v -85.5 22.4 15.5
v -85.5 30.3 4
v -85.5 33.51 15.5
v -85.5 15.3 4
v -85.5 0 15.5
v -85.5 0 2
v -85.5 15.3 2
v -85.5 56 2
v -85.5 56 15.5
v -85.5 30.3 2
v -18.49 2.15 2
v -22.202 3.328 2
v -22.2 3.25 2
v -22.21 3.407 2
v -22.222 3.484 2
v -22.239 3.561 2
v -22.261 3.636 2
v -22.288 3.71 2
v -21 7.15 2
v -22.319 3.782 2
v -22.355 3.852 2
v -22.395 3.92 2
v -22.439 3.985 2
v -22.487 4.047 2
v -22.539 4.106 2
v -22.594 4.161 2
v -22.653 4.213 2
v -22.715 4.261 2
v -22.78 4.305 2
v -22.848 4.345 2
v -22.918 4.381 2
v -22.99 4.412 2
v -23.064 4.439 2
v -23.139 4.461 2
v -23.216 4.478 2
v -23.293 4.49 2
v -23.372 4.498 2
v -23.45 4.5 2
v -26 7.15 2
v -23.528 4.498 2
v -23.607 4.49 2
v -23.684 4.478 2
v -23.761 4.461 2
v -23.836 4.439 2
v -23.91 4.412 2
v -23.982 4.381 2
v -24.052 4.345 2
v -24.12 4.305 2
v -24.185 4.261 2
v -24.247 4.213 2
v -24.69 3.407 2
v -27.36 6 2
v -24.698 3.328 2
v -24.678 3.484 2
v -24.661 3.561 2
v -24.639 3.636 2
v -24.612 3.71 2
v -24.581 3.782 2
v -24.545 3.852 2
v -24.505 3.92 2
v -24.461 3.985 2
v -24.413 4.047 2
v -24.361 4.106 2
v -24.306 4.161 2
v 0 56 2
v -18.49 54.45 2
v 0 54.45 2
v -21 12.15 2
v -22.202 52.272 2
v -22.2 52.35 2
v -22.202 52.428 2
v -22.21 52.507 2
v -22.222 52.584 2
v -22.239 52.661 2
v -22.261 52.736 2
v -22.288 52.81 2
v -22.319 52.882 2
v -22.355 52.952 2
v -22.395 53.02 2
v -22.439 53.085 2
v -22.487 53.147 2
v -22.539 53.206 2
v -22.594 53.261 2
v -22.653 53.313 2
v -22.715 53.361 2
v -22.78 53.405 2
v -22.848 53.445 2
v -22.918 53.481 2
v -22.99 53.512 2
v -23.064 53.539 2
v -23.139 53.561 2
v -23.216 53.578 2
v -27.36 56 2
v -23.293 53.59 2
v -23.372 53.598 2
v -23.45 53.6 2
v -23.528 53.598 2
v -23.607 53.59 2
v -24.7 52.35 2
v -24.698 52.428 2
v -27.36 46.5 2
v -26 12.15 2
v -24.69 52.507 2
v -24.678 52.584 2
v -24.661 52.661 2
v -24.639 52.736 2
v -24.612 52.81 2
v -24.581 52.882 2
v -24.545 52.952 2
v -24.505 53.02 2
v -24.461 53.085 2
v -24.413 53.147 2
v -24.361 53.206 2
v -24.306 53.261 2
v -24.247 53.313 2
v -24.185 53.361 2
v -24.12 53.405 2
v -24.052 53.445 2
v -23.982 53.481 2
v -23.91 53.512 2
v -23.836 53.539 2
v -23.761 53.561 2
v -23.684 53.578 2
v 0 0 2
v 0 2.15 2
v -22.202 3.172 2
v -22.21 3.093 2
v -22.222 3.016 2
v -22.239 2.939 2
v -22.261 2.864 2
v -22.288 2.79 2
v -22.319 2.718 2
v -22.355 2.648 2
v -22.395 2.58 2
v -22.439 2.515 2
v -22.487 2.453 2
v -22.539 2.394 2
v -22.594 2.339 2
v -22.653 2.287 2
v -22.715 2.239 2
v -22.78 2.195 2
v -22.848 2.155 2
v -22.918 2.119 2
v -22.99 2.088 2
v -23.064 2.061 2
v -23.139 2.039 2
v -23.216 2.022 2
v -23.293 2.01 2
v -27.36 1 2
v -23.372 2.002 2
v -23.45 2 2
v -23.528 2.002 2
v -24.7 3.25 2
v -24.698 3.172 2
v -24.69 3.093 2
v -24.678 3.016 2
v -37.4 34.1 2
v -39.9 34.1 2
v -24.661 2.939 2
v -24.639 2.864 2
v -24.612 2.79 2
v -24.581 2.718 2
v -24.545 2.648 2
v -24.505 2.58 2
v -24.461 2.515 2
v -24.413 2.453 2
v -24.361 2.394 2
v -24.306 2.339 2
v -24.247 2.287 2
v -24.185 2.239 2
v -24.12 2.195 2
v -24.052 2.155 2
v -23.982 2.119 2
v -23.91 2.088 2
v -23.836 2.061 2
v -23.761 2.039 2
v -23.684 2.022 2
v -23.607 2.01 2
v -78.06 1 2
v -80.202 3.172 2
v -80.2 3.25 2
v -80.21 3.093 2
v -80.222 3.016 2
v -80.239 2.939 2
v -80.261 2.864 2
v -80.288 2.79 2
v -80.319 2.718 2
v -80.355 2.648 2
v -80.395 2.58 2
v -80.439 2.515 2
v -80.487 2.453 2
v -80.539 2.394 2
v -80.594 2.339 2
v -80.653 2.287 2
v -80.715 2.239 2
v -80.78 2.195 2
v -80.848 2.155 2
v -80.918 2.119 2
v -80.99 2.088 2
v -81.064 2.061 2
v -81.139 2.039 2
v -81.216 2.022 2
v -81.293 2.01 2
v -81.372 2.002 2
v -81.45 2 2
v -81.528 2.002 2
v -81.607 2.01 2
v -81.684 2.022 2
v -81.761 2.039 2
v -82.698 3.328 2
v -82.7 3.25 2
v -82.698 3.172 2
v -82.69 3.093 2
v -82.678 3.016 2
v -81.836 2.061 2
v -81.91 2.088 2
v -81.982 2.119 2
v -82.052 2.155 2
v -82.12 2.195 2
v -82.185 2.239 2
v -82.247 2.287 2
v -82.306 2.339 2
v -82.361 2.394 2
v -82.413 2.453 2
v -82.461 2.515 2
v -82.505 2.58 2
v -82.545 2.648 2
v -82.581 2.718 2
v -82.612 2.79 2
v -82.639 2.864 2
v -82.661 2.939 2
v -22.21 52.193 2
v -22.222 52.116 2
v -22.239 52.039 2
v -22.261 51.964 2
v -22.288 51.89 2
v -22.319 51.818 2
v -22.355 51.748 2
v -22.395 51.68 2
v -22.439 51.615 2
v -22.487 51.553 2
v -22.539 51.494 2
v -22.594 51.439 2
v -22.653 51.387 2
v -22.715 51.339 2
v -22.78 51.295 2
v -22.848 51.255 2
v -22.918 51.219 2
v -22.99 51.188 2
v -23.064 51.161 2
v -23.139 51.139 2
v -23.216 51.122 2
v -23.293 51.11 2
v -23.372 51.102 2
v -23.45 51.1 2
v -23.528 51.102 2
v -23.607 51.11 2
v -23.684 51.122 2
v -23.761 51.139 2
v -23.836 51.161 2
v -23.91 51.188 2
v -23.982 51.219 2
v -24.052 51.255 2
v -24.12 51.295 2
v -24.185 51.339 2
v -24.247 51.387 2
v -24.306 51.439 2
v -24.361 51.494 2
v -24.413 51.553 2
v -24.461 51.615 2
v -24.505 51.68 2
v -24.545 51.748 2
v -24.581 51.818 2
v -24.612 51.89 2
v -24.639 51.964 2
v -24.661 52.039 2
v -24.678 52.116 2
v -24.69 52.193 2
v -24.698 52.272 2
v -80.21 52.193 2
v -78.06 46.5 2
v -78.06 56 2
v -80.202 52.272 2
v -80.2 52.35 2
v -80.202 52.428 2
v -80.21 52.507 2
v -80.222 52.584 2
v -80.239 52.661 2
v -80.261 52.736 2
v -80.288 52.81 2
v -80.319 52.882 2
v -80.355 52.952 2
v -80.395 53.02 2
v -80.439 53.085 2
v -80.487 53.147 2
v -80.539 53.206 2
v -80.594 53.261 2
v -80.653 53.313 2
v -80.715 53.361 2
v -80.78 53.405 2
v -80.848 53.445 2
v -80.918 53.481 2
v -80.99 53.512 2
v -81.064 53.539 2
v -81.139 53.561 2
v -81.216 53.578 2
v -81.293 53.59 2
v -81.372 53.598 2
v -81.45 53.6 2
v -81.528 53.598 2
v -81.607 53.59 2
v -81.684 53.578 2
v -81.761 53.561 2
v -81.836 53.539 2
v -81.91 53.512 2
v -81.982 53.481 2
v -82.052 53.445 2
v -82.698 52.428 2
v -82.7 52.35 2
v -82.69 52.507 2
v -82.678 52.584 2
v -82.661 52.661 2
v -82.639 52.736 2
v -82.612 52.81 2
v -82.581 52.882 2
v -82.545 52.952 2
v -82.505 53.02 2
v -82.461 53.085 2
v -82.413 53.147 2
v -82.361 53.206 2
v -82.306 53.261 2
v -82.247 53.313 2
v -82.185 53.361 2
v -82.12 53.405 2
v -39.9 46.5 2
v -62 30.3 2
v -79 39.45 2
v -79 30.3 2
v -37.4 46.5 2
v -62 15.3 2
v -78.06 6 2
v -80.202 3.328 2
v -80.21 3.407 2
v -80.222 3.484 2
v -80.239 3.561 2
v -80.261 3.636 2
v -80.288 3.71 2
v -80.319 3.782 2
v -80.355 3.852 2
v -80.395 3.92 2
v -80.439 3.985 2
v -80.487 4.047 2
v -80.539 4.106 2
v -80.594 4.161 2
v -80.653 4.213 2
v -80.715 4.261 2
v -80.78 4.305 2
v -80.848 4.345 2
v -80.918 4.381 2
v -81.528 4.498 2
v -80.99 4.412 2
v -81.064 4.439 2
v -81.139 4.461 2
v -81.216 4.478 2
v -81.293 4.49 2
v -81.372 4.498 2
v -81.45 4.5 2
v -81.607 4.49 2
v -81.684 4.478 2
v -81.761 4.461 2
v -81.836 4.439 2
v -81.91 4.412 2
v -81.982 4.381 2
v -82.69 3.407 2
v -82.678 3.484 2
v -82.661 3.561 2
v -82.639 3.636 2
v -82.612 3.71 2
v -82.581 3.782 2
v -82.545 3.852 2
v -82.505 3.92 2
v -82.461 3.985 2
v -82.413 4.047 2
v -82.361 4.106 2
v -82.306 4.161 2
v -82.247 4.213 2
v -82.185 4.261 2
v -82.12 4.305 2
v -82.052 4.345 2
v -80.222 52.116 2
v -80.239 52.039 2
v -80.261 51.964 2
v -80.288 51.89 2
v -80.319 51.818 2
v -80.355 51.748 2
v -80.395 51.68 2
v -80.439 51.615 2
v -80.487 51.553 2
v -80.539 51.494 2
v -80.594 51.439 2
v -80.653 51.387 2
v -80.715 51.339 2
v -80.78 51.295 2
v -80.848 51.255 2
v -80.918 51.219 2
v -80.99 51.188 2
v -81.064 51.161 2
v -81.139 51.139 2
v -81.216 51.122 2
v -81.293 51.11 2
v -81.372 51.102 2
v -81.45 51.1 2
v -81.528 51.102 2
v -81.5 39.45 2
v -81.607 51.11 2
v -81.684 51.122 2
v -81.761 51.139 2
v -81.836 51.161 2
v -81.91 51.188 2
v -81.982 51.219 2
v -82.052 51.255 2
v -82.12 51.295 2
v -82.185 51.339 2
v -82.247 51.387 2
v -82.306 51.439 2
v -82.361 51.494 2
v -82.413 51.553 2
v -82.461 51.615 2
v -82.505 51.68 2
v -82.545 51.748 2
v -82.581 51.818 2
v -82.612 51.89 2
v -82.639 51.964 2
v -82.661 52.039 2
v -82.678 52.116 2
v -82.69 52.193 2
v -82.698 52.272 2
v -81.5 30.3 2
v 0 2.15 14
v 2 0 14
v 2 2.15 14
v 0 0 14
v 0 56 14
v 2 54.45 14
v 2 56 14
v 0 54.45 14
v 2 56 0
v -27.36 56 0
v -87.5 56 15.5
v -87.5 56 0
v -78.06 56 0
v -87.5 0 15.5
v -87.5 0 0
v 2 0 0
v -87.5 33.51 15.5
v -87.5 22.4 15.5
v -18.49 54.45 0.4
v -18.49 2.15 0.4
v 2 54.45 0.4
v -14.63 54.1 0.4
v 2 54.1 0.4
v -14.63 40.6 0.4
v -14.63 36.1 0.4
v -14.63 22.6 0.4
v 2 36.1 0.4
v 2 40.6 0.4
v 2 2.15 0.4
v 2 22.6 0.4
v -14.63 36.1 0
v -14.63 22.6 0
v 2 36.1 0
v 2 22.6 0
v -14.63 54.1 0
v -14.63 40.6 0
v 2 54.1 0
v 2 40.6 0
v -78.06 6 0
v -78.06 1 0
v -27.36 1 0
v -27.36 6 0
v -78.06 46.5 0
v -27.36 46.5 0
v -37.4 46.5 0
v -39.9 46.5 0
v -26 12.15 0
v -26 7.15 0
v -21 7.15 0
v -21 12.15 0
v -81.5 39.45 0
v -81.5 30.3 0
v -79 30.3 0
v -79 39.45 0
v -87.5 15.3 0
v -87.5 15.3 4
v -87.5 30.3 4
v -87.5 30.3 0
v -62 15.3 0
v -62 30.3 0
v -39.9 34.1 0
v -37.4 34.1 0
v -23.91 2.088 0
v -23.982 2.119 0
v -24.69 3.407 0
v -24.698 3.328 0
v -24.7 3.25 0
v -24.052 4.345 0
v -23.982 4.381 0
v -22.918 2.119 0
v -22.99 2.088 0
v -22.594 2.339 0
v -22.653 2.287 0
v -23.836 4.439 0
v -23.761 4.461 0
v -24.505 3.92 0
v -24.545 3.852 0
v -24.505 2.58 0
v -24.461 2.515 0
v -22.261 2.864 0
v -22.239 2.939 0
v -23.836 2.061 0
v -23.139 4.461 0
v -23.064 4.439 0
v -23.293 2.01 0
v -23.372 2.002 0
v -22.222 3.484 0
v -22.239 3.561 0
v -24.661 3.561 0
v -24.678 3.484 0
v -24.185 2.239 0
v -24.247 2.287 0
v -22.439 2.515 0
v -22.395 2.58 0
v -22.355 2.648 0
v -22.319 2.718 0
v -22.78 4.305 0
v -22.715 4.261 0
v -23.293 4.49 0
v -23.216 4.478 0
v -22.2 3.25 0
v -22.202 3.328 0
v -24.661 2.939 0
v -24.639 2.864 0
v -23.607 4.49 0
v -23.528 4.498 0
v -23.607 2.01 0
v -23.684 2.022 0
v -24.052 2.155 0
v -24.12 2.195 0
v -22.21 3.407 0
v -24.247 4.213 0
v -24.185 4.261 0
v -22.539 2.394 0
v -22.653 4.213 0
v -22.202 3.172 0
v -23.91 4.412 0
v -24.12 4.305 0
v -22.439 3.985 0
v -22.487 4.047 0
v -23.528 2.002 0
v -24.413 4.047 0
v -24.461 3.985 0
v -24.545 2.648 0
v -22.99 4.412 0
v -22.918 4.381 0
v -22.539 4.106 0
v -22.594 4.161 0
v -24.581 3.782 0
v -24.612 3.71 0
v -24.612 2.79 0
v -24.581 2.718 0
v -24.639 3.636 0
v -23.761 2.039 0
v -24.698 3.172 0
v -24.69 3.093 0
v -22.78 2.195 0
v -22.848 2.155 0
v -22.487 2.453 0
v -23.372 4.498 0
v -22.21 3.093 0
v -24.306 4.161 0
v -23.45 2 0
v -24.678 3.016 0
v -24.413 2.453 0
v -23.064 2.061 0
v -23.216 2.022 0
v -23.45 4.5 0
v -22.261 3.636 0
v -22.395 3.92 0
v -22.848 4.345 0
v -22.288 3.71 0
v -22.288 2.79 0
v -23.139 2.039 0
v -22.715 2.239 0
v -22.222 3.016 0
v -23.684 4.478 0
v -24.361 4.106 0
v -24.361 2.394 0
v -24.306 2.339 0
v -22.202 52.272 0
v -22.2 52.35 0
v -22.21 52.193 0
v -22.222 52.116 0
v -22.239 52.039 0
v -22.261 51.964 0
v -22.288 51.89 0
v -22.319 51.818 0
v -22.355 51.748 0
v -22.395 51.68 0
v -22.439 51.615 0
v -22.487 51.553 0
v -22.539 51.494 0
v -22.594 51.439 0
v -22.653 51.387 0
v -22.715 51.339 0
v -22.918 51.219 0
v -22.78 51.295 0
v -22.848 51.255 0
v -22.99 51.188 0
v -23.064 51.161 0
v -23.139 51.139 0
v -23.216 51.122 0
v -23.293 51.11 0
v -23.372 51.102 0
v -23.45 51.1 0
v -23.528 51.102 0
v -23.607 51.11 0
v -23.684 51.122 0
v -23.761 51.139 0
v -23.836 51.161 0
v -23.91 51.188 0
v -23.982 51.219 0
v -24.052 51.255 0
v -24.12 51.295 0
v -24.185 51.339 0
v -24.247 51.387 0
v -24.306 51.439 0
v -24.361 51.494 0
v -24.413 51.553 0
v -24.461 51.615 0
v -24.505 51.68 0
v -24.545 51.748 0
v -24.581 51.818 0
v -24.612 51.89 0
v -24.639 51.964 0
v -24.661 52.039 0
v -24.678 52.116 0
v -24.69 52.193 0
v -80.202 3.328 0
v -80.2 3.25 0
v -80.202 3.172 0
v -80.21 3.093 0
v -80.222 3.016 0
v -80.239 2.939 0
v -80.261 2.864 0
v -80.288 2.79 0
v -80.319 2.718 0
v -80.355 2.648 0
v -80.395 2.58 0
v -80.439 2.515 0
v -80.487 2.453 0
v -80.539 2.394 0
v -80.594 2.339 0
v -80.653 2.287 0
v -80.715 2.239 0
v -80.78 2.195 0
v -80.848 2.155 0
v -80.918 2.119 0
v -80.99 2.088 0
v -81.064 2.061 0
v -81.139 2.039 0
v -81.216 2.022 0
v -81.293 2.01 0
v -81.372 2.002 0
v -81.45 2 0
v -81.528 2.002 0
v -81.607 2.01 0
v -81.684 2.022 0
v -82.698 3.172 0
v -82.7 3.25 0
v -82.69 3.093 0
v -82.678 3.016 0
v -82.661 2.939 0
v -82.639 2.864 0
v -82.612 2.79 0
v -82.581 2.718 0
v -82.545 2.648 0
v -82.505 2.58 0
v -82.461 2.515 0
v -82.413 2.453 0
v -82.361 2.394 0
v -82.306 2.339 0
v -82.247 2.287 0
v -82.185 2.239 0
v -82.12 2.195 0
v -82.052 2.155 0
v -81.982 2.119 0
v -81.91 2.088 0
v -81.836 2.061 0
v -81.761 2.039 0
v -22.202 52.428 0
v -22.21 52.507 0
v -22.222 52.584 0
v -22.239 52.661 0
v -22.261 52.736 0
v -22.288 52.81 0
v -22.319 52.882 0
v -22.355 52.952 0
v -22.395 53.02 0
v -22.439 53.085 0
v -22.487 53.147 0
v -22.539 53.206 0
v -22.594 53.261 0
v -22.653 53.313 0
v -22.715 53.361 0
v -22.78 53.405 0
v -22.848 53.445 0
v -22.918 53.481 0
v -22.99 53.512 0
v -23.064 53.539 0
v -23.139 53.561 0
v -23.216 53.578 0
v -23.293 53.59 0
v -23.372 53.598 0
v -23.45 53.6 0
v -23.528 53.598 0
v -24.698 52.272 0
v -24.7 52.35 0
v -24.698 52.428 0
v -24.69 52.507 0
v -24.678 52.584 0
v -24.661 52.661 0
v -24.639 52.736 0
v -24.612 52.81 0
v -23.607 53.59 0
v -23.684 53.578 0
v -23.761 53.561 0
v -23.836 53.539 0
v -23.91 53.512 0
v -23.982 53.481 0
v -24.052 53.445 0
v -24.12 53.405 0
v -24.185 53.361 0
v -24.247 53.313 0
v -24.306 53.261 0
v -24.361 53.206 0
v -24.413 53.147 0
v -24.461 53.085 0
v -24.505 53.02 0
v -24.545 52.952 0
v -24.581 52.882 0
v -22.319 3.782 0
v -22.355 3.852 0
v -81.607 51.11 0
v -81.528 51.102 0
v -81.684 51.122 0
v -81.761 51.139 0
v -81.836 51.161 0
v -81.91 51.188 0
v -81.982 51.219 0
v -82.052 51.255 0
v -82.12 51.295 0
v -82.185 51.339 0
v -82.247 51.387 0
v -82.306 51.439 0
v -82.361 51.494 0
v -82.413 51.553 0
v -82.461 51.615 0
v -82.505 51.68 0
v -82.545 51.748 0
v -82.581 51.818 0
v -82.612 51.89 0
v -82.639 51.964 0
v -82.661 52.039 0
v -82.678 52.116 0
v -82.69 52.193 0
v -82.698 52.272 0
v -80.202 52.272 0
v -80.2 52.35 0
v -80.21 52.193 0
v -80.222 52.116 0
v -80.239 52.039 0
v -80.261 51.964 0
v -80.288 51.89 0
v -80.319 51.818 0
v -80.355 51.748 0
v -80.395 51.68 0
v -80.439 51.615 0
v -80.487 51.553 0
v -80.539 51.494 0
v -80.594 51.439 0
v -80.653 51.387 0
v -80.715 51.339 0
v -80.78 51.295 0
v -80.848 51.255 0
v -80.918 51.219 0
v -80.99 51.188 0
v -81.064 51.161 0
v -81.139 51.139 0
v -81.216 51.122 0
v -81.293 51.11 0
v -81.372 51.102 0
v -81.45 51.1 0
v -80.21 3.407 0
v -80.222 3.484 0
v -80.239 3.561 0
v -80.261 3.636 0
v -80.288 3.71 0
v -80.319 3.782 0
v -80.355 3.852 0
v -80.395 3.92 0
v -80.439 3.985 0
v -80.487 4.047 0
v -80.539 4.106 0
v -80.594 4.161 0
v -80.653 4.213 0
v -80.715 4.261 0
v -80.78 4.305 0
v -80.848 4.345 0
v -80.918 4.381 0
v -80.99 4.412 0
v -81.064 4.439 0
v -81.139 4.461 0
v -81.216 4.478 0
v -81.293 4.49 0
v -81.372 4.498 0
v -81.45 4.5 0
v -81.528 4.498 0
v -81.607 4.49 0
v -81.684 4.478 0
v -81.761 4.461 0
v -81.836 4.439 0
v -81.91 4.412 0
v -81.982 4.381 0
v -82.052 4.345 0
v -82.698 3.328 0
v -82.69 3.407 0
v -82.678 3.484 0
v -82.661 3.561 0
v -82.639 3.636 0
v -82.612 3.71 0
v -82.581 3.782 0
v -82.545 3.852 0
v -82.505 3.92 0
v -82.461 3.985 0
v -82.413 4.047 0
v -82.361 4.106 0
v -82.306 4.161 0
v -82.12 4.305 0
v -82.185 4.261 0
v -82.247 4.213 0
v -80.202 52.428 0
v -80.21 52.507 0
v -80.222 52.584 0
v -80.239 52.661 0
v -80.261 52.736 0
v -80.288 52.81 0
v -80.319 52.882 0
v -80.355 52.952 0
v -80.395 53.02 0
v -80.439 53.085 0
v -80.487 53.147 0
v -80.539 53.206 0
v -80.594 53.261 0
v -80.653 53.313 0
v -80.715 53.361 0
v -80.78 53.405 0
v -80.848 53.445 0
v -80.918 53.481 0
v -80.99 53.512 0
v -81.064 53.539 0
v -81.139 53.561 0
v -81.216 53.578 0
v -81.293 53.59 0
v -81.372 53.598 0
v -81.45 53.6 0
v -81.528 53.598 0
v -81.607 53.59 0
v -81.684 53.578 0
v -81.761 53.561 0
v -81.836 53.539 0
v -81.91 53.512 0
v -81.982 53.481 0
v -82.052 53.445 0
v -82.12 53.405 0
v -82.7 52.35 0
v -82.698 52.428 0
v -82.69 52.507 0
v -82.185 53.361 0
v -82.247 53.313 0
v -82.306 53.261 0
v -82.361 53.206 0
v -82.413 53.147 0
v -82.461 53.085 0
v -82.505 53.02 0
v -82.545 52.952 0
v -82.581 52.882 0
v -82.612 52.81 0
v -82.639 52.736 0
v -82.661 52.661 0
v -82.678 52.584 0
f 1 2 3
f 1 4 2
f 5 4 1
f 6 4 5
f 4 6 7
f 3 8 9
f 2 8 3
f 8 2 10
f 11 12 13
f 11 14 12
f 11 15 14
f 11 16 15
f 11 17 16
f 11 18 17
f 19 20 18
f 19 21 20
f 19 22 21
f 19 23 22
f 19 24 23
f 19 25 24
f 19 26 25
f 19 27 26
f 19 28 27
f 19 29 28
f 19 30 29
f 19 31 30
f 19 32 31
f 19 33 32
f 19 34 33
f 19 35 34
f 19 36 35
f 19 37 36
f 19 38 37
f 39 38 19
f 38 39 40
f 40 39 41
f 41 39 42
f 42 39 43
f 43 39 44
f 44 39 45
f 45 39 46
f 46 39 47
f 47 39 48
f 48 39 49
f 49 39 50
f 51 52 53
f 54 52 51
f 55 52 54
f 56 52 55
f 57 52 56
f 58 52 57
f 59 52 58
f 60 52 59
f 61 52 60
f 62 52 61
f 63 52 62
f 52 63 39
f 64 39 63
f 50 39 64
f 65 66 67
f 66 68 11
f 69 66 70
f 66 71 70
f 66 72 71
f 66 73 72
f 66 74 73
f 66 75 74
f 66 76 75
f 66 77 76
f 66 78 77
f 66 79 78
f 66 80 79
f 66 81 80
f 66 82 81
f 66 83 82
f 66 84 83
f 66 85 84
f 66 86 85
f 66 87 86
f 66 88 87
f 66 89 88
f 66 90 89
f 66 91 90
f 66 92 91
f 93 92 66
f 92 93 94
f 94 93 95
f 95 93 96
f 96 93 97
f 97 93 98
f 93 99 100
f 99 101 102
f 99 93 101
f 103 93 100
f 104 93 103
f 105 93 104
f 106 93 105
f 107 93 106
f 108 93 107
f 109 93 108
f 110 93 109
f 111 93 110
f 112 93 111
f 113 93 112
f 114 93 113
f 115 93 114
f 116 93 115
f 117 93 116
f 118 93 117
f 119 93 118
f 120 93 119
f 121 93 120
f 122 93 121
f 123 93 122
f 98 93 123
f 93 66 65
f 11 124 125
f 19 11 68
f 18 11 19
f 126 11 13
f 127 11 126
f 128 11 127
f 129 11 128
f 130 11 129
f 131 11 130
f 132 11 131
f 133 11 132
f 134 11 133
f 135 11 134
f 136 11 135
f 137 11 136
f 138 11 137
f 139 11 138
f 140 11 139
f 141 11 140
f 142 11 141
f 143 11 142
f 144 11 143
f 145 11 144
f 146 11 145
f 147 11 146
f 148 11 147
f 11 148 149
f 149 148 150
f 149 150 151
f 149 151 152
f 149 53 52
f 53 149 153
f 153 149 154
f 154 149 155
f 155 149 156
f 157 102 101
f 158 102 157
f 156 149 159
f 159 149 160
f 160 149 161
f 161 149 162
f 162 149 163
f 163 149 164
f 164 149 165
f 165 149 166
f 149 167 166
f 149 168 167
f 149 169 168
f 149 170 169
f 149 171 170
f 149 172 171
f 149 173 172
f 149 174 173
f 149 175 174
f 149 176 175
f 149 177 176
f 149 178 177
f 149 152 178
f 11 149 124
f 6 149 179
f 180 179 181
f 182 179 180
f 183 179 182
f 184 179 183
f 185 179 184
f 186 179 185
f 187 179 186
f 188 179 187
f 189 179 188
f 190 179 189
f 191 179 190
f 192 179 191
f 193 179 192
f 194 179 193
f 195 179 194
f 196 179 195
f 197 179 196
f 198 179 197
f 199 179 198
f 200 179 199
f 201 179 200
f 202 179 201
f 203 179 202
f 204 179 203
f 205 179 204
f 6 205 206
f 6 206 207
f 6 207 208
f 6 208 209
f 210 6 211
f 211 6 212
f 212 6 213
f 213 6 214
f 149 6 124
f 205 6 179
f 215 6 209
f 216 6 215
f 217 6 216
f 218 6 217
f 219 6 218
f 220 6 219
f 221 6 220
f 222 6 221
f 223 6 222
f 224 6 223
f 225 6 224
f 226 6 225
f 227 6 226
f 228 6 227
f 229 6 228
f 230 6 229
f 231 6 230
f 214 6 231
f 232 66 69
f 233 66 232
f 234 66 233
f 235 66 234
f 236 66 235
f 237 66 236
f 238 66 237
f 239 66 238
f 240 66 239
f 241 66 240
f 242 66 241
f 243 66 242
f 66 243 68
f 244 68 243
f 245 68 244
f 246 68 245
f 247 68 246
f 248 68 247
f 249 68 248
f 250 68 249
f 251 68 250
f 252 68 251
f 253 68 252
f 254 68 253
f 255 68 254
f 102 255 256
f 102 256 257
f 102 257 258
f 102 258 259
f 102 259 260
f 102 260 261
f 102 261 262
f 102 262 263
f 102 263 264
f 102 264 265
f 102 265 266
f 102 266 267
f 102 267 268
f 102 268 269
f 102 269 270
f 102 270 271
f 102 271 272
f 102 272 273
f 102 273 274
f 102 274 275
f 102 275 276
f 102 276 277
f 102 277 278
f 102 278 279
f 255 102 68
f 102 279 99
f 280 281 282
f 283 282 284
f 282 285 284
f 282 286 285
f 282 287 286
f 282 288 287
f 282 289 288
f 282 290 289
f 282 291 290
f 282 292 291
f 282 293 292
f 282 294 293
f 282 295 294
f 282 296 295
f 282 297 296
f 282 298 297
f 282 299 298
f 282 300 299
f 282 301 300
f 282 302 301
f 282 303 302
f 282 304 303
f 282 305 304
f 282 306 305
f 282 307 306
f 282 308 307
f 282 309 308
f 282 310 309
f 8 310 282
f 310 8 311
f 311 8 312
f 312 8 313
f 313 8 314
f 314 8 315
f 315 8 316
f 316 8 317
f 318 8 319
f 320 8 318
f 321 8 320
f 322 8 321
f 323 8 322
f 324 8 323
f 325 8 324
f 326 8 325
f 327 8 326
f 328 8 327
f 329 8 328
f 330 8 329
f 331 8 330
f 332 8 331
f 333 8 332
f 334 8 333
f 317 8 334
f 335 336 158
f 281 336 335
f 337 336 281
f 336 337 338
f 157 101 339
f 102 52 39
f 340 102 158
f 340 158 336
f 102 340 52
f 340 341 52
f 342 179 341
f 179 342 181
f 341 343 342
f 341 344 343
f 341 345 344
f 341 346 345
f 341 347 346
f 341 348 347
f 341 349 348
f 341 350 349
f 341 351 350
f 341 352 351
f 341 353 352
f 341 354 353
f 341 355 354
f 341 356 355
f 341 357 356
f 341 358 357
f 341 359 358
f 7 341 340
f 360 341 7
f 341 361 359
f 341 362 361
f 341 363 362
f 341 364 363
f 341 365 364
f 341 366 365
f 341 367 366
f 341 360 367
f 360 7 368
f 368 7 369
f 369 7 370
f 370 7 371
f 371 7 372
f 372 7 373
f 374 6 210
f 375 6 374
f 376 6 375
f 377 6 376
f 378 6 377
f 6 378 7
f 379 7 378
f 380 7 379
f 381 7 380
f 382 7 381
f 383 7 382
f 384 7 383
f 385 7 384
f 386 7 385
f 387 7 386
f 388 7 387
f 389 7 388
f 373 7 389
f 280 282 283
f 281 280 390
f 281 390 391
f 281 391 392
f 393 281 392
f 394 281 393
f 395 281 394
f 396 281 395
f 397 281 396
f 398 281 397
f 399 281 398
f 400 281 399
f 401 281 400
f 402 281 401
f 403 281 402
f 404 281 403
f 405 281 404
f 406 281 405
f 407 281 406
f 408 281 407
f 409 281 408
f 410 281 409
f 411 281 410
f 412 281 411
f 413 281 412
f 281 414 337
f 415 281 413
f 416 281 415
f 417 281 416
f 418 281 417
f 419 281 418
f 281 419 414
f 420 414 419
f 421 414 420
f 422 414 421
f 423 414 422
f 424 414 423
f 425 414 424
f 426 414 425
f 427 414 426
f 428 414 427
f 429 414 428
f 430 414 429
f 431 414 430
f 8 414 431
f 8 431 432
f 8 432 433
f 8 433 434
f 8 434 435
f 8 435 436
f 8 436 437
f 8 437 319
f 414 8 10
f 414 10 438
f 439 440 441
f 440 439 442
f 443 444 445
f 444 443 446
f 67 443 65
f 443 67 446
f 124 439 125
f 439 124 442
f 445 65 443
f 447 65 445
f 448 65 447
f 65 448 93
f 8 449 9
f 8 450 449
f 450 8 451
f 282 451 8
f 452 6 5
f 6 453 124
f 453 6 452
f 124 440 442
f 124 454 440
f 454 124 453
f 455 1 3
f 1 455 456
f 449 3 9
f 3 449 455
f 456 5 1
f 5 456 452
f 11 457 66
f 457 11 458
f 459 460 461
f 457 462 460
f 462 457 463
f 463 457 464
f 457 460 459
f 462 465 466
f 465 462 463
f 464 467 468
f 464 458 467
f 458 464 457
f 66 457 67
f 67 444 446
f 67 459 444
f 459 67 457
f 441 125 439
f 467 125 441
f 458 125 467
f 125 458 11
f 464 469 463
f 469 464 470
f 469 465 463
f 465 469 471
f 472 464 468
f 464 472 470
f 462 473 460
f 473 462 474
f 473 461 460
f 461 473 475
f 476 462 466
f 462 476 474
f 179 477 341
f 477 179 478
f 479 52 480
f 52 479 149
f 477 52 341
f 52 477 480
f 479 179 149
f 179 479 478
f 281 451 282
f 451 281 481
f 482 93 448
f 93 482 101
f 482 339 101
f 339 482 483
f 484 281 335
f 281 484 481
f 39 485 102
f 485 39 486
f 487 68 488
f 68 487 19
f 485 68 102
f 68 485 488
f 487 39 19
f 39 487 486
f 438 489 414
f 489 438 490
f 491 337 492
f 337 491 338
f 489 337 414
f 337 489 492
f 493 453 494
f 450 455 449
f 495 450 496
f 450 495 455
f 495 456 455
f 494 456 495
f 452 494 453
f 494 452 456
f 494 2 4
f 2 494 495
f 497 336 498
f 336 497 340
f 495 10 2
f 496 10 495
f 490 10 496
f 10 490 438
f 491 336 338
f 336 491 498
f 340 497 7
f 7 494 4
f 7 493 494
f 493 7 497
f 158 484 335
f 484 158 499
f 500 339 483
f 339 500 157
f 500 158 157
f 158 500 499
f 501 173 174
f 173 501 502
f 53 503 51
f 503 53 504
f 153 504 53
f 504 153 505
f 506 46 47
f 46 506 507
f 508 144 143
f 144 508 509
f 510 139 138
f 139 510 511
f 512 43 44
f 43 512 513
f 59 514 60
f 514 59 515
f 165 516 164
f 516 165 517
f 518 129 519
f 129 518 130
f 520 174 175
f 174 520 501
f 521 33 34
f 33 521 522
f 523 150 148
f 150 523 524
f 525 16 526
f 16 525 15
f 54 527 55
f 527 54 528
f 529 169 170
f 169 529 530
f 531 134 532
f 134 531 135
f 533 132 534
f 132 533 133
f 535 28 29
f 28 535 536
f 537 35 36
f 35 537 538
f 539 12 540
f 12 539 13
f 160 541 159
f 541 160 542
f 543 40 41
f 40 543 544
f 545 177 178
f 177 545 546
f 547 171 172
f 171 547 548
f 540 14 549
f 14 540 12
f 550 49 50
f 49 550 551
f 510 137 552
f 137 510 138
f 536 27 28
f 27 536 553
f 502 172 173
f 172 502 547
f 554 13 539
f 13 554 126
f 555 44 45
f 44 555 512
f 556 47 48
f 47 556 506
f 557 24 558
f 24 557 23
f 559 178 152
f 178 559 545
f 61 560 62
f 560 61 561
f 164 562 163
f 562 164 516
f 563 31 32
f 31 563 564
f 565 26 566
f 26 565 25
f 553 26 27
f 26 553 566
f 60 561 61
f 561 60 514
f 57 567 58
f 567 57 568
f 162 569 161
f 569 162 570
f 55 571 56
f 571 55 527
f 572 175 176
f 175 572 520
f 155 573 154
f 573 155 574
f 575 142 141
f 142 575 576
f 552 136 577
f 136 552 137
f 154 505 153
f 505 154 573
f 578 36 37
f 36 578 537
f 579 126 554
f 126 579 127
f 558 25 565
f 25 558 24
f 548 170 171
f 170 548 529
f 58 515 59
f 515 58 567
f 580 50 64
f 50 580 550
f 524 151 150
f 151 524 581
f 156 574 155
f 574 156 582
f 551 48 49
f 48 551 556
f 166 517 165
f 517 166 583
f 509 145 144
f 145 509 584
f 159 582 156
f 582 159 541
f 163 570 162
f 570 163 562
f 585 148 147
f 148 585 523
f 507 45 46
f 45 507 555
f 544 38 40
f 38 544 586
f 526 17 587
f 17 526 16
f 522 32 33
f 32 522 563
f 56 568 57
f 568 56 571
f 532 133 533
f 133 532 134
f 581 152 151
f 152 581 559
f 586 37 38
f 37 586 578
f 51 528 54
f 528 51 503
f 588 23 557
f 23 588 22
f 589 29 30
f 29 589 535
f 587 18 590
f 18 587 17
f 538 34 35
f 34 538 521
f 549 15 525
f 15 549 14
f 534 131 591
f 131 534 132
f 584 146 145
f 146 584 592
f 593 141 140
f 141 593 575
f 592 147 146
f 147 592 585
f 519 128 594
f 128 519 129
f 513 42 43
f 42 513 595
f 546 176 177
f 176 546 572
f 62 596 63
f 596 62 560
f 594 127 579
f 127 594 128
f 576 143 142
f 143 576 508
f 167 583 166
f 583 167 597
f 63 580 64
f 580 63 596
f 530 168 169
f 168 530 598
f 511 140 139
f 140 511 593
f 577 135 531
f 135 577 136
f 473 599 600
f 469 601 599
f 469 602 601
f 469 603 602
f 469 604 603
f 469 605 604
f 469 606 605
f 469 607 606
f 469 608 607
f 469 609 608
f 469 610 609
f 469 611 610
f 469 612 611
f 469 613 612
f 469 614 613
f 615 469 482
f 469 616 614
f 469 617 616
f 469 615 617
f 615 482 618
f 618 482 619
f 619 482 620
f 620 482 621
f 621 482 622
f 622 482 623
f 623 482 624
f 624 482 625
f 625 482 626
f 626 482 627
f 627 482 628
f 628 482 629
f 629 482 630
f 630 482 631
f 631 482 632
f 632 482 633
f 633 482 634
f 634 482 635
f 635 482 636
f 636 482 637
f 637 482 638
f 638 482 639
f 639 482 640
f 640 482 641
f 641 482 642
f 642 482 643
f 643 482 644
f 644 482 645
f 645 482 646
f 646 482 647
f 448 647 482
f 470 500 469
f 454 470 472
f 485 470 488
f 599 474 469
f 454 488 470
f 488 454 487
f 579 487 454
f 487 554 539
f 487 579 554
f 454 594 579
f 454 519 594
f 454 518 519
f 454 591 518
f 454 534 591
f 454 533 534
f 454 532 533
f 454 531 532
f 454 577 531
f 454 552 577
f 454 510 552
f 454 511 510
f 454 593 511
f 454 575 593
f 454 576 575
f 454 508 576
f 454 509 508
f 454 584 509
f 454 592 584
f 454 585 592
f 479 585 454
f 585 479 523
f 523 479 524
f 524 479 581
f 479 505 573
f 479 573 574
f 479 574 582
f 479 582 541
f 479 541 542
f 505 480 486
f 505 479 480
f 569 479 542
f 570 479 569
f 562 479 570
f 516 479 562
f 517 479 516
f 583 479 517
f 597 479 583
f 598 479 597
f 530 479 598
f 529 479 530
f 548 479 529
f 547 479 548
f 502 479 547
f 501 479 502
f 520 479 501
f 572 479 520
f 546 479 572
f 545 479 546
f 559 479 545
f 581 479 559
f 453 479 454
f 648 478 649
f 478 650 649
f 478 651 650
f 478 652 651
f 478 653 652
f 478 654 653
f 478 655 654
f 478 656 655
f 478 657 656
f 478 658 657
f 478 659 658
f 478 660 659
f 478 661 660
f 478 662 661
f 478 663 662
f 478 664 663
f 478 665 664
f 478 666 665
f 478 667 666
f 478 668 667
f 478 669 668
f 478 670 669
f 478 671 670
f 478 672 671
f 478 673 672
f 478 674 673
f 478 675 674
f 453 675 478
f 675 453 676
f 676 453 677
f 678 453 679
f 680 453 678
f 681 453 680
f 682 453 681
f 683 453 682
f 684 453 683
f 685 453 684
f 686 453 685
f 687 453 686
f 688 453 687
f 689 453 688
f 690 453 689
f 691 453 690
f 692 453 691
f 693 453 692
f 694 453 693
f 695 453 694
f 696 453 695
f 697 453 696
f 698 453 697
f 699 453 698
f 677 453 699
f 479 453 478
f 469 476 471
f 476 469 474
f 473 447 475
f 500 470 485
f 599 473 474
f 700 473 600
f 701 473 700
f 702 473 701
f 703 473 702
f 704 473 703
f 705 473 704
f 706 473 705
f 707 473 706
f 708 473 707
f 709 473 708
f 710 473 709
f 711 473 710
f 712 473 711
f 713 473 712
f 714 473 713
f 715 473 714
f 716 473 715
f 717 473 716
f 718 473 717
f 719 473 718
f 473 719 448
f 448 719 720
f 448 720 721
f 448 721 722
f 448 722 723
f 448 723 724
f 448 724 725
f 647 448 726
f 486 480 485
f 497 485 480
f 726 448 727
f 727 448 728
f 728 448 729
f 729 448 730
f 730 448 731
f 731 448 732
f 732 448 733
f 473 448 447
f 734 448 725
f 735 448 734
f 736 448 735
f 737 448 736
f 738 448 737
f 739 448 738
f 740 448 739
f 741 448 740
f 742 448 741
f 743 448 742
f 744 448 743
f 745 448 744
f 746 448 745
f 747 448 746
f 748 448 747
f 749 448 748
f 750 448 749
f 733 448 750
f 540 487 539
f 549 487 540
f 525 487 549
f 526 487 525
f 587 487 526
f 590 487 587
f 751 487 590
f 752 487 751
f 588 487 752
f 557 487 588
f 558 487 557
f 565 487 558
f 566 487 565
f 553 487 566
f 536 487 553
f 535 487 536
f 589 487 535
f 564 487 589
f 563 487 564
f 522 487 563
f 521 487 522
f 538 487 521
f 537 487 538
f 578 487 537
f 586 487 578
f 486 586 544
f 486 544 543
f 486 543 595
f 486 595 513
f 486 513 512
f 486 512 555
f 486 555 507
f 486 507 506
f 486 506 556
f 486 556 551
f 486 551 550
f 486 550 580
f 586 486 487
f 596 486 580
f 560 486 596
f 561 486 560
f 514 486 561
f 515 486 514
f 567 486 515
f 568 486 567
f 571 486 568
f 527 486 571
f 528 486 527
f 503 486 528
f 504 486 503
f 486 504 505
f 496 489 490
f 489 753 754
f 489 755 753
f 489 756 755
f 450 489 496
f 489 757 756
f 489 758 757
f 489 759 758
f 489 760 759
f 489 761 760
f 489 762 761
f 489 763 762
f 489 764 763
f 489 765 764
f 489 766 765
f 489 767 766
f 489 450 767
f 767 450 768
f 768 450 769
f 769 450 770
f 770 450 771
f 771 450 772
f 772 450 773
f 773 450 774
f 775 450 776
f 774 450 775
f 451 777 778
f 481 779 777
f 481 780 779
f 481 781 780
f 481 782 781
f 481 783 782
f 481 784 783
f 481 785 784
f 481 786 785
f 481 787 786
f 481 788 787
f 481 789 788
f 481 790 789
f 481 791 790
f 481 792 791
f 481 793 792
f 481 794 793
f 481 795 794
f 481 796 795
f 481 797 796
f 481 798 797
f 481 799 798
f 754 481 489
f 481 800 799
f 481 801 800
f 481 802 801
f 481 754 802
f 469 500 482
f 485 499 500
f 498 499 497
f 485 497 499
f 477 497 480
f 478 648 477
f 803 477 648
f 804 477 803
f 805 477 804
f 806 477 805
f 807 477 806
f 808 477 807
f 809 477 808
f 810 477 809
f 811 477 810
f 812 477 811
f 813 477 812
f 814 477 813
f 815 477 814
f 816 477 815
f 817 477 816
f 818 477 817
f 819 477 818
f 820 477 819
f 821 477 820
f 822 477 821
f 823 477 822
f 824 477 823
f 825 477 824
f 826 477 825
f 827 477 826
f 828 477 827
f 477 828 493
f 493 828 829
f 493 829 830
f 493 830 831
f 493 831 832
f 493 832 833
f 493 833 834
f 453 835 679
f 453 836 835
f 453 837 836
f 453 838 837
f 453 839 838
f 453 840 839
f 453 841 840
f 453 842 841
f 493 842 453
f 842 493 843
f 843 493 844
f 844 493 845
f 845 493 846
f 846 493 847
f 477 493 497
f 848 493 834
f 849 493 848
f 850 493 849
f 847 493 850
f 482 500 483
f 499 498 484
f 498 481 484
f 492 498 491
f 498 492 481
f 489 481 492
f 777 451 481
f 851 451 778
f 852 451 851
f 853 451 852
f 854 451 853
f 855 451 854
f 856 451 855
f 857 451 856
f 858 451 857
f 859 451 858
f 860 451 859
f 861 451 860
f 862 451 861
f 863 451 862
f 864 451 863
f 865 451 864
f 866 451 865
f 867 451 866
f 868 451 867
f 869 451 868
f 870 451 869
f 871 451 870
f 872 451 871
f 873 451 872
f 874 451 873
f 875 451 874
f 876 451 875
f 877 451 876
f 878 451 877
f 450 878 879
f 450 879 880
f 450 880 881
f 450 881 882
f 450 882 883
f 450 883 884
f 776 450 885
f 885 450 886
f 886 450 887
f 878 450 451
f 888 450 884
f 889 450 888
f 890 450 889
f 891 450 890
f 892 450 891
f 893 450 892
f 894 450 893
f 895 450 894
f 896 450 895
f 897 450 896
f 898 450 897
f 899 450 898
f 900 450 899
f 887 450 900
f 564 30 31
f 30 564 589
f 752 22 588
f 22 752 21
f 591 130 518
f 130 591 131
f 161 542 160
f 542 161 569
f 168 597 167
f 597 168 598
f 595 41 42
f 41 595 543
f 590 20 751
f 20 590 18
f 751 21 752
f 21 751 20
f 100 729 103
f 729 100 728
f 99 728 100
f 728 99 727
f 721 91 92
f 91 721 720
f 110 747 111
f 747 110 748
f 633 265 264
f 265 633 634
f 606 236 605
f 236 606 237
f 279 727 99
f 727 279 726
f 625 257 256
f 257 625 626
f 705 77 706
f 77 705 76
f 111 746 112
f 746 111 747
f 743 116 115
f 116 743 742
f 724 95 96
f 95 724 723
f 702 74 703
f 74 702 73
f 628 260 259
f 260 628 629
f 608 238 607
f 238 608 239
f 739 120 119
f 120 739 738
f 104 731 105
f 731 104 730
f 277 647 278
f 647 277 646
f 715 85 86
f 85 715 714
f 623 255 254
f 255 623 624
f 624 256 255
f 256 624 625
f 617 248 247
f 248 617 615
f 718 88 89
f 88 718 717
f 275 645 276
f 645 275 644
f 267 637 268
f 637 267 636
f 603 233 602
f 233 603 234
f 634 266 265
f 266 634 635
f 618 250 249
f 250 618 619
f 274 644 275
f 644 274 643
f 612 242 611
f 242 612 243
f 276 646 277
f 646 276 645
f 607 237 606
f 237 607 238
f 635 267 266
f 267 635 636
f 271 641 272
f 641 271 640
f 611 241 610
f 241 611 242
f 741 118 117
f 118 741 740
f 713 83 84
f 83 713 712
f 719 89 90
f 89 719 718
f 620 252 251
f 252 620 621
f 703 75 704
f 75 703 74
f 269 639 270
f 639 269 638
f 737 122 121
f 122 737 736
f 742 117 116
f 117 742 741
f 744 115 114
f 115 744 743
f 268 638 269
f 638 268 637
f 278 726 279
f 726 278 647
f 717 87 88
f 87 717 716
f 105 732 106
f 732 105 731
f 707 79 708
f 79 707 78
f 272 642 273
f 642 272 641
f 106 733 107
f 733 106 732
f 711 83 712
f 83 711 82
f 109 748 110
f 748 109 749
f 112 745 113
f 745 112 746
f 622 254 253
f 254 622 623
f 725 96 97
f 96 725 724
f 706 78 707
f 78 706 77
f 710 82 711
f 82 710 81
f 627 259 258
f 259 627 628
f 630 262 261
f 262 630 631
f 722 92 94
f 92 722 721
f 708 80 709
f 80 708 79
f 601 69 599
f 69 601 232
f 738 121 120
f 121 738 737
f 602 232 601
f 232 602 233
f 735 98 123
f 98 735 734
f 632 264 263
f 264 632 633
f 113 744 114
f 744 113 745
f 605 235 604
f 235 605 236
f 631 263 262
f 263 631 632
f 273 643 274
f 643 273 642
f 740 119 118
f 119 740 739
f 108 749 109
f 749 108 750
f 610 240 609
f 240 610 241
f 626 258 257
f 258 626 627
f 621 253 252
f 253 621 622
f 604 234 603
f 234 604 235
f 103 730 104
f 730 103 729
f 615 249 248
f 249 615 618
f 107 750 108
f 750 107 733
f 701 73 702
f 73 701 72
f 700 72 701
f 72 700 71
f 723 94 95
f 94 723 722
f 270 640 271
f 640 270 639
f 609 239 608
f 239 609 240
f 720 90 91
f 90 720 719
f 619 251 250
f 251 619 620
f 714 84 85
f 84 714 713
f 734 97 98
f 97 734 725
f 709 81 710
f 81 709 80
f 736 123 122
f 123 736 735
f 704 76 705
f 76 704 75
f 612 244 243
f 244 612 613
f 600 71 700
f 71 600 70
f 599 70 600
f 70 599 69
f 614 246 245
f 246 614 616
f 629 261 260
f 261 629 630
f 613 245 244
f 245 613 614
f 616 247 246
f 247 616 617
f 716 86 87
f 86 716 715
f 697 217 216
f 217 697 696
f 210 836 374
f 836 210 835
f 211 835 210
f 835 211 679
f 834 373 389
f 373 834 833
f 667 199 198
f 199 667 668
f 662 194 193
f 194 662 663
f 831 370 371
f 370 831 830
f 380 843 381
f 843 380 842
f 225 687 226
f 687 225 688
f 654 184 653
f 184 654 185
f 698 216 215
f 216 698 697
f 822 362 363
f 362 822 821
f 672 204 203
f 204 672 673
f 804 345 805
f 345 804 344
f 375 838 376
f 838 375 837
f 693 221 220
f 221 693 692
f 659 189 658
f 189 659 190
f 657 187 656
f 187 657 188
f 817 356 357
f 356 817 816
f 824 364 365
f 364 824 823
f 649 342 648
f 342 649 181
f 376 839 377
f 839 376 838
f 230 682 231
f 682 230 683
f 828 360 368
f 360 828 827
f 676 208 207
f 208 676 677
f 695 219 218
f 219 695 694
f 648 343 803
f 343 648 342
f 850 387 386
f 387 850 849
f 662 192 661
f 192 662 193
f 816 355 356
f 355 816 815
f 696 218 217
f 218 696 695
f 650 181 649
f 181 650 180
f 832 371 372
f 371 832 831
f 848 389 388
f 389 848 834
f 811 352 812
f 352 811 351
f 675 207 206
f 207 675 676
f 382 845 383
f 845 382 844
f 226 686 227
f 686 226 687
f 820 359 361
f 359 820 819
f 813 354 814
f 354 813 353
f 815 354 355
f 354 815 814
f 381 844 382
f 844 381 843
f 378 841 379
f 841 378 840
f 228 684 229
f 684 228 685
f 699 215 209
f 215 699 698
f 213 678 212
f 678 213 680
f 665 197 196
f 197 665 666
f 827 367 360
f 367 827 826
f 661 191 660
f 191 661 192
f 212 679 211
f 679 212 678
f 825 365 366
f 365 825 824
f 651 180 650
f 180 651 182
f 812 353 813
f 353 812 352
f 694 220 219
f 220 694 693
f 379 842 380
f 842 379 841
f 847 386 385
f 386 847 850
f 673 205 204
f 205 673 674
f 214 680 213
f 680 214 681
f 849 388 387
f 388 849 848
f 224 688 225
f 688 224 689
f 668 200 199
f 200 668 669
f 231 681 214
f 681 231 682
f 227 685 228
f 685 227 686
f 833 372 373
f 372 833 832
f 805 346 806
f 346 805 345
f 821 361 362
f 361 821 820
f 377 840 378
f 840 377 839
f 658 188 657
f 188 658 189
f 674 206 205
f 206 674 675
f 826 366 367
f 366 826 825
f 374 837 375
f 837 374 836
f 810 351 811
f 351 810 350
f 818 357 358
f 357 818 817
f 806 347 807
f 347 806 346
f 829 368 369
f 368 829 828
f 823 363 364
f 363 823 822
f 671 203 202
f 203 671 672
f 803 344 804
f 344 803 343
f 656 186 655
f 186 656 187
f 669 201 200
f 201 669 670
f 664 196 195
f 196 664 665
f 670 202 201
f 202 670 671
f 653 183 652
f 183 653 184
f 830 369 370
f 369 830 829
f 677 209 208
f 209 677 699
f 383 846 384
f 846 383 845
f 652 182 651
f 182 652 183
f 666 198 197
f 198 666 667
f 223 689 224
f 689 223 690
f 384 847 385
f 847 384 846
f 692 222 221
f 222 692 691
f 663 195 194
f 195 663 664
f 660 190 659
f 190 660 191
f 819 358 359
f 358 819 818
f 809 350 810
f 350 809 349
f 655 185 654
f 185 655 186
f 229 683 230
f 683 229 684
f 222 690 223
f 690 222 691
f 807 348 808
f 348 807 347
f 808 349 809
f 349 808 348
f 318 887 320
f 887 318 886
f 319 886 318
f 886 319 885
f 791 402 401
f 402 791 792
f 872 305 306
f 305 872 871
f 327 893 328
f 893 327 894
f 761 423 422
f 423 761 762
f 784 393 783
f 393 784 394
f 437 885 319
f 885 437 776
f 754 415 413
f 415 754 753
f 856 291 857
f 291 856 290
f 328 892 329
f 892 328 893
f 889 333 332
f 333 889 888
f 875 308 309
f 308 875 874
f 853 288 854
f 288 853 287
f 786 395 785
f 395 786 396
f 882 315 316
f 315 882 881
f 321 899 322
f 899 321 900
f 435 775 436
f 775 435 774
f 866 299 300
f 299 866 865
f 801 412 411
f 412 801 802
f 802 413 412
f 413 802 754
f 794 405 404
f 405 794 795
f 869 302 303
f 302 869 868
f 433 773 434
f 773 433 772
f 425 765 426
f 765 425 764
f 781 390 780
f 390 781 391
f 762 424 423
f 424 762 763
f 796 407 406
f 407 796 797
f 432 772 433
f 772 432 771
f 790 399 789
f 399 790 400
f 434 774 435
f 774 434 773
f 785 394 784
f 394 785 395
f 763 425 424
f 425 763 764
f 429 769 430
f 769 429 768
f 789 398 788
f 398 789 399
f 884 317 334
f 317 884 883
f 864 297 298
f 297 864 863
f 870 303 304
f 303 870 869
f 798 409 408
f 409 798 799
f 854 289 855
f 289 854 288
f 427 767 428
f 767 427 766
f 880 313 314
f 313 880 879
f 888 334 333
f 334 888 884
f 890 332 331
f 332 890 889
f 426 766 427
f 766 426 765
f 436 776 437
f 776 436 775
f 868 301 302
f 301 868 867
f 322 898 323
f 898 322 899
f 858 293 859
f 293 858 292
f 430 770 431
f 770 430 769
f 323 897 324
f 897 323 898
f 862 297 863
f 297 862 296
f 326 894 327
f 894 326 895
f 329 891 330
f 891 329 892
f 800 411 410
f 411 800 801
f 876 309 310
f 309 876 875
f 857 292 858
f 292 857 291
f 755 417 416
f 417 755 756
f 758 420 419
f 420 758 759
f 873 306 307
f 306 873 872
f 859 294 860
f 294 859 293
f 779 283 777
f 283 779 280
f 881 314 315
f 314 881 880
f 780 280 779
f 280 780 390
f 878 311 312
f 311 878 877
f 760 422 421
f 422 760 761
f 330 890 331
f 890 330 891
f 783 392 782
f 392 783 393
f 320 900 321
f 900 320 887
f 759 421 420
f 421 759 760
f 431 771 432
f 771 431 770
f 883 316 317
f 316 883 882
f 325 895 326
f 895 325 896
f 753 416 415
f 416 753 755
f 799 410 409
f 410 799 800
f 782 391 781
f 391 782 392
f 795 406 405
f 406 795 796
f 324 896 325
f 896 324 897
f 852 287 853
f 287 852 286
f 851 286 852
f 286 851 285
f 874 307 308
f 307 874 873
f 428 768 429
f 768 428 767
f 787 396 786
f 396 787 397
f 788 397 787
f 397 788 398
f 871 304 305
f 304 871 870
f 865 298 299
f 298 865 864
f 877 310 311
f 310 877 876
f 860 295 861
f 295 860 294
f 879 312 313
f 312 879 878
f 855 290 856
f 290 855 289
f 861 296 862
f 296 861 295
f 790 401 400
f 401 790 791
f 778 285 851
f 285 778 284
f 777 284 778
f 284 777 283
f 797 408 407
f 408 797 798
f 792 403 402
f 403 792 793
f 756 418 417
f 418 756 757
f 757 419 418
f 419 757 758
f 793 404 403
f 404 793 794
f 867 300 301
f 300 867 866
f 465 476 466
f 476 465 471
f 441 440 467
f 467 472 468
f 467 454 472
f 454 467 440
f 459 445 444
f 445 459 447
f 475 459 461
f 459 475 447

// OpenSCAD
// Raspberry pi 4 model case by George Onoufriou (Raven, GeorgeRaven, Archer) C 2019-06-30
// please see licence in project root https://github.com/DreamingRaven/RavenSCAD/blob/master/LICENSE

// |-=========---------| <-The back right of the board is the point everything else is relative to
// | o            o    |
// | o            o    |
// ||_|----------------|

board_thickness = 1.5; // the space for the board itself only
pin_space = 3;//2.2; // the min space that the throughhole components require underneath
$fn = 100; // how detailed the circular components are (holes + mounts), not super important
extension = 20; // extension to lengths so case can be subtractiveley created
inhibitionzone_height = 12; // creates an inhibition zone for surface components
case_thickness = 2;//2; // sets the case thickness
pil = 85.5; // this is the length of the pi board only
pid = 56; // this is the width / depth of the pi board only
pih = board_thickness;
sd_height = pin_space + case_thickness + board_thickness; // is how tall the sd card part sticking out is so if you increase it will cut more out for case
mount_pin_height = 2*board_thickness + 2*case_thickness + pin_space + inhibitionzone_height;//31; // this is the most awkward one of the set as it sets the mount point pin size

// fan mount options
fan_pin_diam = 3;
fan_position_x = 44.3; // the offset of the fan from the right
fan_position_y = 14; // the offset of the fan from the top
fan_pin_distance = 31.5; // the distance between the mount holes


// uncomment here what you dont want to generate
 translate([0,0,inhibitionzone_height + case_thickness + board_thickness]) rotate([0,180,0]) intersection(){ // top of case
  rpi4_case();
  topSelector();
}
/*
 translate([30,0,case_thickness]) rotate([0,-0,0]) difference(){ // bottom of case
  rpi4_case();
  topSelector();
  translate([0,0,10])topSelector();
}
//translate([-pil,pid+case_thickness*2+5]) rpi4_case(); // the whole unsplit case
*/
//translate([extension+17.44,pid+case_thickness*2+5,0]) rpi4(); // the raspberry pi 4 and associated tolerances


// here follows all the modules used to generate what you want.
module topSelector()
{
  difference(){ // this difference selects the top and bottom parts of the case with a small lip for the IO
    translate([-case_thickness,0,0]) cube([pil+2*case_thickness,pid,pin_space+inhibitionzone_height+case_thickness]);  // test hull
    translate([-case_thickness,0,0]) cube([case_thickness,pid,board_thickness]);
  }
}


module rpi4_case()
{
  difference(){ // subtracts the rpi4 model from a cube to generate the case
    translate([-case_thickness,-case_thickness,-(case_thickness + pin_space)])
    cube([pil+(2*case_thickness),
      pid+(2*case_thickness),
      pin_space+inhibitionzone_height+board_thickness+(2*case_thickness)+0]); // the case itself
    union(){
      rpi4();
      pins(); // generating the pins themselves so the holes can be inhibited
    }
  }
}

module rpi4(){

  difference(){ // this creates the mount holes
    translate([0,0,board_thickness]){ // two translations cancel out but make maths simpler before they do
      translate([0,0,-(board_thickness)]) // the translation which ^ cancels out
      {
        cube([pil,pid,board_thickness]); // the board only (not the underpins)
      }
      // these are the big surface level components
      #translate([-(2.81+extension),2.15,0]) cube([21.3+extension,16.3+36,13.6]);   // Ethenrnet port
      #translate([-(2.81+extension),22.6,0]) cube([17.44+extension,13.5,15.6]);  // USB 3.0
      #translate([-(2.81+extension),40.6,0]) cube([17.44+extension,13.5,15.6]);  // USB 2.0
      #translate([27.36,1,0]) cube([50.7,5.0,8.6+extension]);                    // GPIO pins
      #translate([27.36,1+45.5,0]) cube([50.7,5.0+3+2,8.6+extension]);             // Adafruit servo hat
      translate([21,7.15,0]) cube([5.0,5.0,8.6+extension]);                     // Power over ethernet pins
      translate([48.0,16.3,0]) cube([15.0,15.0,2.5]);                           // cpu
      translate([67.5,6.8,0]) cube([10.8,13.1,1.8]);                            // onboard wifi
      translate([79,17.3,0]) cube([2.5,22.15,5.4+extension]);                   // display connector
      #translate([79-17,17.3-5+3,10]) cube([2.5+23,15,5.4+extension]);         // 5v power jack
      translate([69.1,50,0]) cube([9.7,7.4+extension,3.6]);                     // USB type c power
      translate([55.0,50,0]) cube([7.95,7.8+extension,3.9]);                    // Micro HDMI0
      translate([41.2,50,0]) cube([7.95,7.8+extension,3.9]);                    // Micro HDMI1
      translate([37.4,34.1,0]) cube([2.5,22.15,5.4+extension]);                 // CSI camera connector
      translate([26.9,43.55,0]) cube([8.5,14.95+extension,6.9]);                  // Audio jack
      translate([85,22.4,-(board_thickness+sd_height)]) cube([2.55+extension,11.11,sd_height]); // SD card (poking out)
      //translate([fan_position_x,fan_position_y,0]) cylinder(extension,d=fan_pin_diam, center=false);                            // fan mount top-r
      //translate([fan_position_x,fan_position_y+fan_pin_distance,0]) cylinder(extension,d=fan_pin_diam, center=false);                 // fan mount bot-r
      //translate([fan_position_x+fan_pin_distance,fan_position_y,0]) cylinder(extension,d=fan_pin_diam, center=false);                 // fan mount top-l
      //translate([fan_position_x+fan_pin_distance,fan_position_y+fan_pin_distance,0]) cylinder(extension,d=fan_pin_diam, center=false);      // fan mount bot-l
      //translate([fan_position_x+0.5*fan_pin_distance,fan_position_y+0.5*fan_pin_distance,0]) cylinder(extension,d=fan_pin_distance+fan_pin_diam, center=false);      // fan air hole
     /*
     */
      translate([53,7.8,0]){ scale([10,1,1]){
        translate([0,0,-extension-board_thickness-pin_space])  cylinder(extension,d=5, center=false);      // under-side air hole
        translate([0,10,-extension-board_thickness-pin_space]) cylinder(extension,d=5, center=false);      // under-side air hole
        translate([0,20,-extension-board_thickness-pin_space]) cylinder(extension,d=5, center=false);      // under-side air hole
        translate([0,30,-extension-board_thickness-pin_space]) cylinder(extension,d=5, center=false);      // under-side air hole
        translate([0,40,-extension-board_thickness-pin_space]) cylinder(extension,d=5, center=false);      // under-side air hole
      }
      }

      difference(){ // this creates the mount points around the mount holes esp the underneath ones
        union(){
          translate([0,0,0]) cube([pil,pid,inhibitionzone_height]);                           // cpu
          translate([0,0,-(pin_space+board_thickness)]) cube([pil,pid,pin_space]); // underpins only
        }
        //mounts(); // the material which is above and below the board to keep it in place which the pins go through
      }
    } // end of translation cancel
  //pins(); // the hole which will be screwed into to put both halves of the case and board together
  }
}

module mounts(){
  translate([1.25,1.25,(0.5*mount_pin_height)-(board_thickness+case_thickness+pin_space)]){ // this is to move all the pins
          translate([22.2,2,0]) cylinder(mount_pin_height,d=5.9, center=true);     // mount top-r
          translate([22.2,51.1,0]) cylinder(mount_pin_height,d=5.9, center=true);  // mount bot-r
          translate([80.2,2,0]) cylinder(mount_pin_height,d=5.9, center=true);     // mount top-l
          translate([80.2,51.1,0]) cylinder(mount_pin_height,d=5.9, center=true);  // mount bot-l
        }
}

module pins(){
  translate([1.25,1.25,(0.5*mount_pin_height)-(board_thickness+case_thickness+pin_space)]){ // this is to move all the pins
    translate([22.2,2,0]) cylinder(mount_pin_height,d=2.5, center=true);     // hole  top-r
    translate([22.2,51.1,0]) cylinder(mount_pin_height,d=2.5, center=true);  // hole  bot-r
    translate([80.2,2,0]) cylinder(mount_pin_height,d=2.5, center=true);     // hole  top-l
    translate([80.2,51.1,0]) cylinder(mount_pin_height,d=2.5, center=true);  // hole  bot-l
  }
}
